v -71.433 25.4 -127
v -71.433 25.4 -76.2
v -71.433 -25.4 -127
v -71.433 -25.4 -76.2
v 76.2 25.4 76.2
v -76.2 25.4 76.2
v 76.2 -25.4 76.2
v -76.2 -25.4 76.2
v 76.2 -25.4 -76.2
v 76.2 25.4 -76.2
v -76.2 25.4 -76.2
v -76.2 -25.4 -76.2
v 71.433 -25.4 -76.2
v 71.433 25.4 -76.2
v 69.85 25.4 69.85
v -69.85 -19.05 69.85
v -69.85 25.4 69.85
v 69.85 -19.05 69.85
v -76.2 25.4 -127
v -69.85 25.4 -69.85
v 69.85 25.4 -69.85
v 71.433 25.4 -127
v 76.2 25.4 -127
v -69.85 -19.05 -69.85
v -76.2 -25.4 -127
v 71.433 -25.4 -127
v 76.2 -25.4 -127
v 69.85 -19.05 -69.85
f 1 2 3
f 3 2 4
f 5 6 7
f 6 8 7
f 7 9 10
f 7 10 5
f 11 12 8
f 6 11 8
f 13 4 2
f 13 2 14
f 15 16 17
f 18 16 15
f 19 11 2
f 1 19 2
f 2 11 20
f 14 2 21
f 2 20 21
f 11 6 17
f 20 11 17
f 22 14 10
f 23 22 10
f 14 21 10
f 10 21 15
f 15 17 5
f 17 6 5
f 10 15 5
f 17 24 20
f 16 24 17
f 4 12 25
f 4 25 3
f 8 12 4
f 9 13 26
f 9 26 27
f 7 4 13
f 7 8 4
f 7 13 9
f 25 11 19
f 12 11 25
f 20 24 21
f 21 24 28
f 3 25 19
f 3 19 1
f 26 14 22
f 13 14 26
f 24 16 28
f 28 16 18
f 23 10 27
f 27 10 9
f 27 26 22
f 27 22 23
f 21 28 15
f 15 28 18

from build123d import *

# Parameters (mm, degrees)
F0_W     = 152.4
F0_H     = 152.4
F1_DEPTH = 25.4
F2_T     = -6.35
F3_W     = 4.766873
F3_H     = 50.8
F4_DEPTH = 50.8


with BuildPart() as f1:
    # F0 (on Front) → F1 (new body, symmetric)
    with BuildSketch(Plane.XZ):
        Rectangle(F0_W, F0_H)
    extrude(amount=F1_DEPTH, both=True)

    # F2
    f2_openings = [f1.faces().sort_by_distance(p)[0] for p in [
        (0, 25.4, 0),
    ]]
    offset(amount=F2_T, openings=f2_openings)

    # F3 (on face) → F4 (join)
    with BuildSketch(Plane(origin=(0, 0, -76.2), x_dir=(1, 0, 0), z_dir=(0, 0, -1))):
        with Locations((-73.816564, 0)):
            Rectangle(F3_W, F3_H)
        with Locations((73.816564, 0)):
            Rectangle(F3_W, F3_H)
    extrude(amount=F4_DEPTH)


solid = f1.part
